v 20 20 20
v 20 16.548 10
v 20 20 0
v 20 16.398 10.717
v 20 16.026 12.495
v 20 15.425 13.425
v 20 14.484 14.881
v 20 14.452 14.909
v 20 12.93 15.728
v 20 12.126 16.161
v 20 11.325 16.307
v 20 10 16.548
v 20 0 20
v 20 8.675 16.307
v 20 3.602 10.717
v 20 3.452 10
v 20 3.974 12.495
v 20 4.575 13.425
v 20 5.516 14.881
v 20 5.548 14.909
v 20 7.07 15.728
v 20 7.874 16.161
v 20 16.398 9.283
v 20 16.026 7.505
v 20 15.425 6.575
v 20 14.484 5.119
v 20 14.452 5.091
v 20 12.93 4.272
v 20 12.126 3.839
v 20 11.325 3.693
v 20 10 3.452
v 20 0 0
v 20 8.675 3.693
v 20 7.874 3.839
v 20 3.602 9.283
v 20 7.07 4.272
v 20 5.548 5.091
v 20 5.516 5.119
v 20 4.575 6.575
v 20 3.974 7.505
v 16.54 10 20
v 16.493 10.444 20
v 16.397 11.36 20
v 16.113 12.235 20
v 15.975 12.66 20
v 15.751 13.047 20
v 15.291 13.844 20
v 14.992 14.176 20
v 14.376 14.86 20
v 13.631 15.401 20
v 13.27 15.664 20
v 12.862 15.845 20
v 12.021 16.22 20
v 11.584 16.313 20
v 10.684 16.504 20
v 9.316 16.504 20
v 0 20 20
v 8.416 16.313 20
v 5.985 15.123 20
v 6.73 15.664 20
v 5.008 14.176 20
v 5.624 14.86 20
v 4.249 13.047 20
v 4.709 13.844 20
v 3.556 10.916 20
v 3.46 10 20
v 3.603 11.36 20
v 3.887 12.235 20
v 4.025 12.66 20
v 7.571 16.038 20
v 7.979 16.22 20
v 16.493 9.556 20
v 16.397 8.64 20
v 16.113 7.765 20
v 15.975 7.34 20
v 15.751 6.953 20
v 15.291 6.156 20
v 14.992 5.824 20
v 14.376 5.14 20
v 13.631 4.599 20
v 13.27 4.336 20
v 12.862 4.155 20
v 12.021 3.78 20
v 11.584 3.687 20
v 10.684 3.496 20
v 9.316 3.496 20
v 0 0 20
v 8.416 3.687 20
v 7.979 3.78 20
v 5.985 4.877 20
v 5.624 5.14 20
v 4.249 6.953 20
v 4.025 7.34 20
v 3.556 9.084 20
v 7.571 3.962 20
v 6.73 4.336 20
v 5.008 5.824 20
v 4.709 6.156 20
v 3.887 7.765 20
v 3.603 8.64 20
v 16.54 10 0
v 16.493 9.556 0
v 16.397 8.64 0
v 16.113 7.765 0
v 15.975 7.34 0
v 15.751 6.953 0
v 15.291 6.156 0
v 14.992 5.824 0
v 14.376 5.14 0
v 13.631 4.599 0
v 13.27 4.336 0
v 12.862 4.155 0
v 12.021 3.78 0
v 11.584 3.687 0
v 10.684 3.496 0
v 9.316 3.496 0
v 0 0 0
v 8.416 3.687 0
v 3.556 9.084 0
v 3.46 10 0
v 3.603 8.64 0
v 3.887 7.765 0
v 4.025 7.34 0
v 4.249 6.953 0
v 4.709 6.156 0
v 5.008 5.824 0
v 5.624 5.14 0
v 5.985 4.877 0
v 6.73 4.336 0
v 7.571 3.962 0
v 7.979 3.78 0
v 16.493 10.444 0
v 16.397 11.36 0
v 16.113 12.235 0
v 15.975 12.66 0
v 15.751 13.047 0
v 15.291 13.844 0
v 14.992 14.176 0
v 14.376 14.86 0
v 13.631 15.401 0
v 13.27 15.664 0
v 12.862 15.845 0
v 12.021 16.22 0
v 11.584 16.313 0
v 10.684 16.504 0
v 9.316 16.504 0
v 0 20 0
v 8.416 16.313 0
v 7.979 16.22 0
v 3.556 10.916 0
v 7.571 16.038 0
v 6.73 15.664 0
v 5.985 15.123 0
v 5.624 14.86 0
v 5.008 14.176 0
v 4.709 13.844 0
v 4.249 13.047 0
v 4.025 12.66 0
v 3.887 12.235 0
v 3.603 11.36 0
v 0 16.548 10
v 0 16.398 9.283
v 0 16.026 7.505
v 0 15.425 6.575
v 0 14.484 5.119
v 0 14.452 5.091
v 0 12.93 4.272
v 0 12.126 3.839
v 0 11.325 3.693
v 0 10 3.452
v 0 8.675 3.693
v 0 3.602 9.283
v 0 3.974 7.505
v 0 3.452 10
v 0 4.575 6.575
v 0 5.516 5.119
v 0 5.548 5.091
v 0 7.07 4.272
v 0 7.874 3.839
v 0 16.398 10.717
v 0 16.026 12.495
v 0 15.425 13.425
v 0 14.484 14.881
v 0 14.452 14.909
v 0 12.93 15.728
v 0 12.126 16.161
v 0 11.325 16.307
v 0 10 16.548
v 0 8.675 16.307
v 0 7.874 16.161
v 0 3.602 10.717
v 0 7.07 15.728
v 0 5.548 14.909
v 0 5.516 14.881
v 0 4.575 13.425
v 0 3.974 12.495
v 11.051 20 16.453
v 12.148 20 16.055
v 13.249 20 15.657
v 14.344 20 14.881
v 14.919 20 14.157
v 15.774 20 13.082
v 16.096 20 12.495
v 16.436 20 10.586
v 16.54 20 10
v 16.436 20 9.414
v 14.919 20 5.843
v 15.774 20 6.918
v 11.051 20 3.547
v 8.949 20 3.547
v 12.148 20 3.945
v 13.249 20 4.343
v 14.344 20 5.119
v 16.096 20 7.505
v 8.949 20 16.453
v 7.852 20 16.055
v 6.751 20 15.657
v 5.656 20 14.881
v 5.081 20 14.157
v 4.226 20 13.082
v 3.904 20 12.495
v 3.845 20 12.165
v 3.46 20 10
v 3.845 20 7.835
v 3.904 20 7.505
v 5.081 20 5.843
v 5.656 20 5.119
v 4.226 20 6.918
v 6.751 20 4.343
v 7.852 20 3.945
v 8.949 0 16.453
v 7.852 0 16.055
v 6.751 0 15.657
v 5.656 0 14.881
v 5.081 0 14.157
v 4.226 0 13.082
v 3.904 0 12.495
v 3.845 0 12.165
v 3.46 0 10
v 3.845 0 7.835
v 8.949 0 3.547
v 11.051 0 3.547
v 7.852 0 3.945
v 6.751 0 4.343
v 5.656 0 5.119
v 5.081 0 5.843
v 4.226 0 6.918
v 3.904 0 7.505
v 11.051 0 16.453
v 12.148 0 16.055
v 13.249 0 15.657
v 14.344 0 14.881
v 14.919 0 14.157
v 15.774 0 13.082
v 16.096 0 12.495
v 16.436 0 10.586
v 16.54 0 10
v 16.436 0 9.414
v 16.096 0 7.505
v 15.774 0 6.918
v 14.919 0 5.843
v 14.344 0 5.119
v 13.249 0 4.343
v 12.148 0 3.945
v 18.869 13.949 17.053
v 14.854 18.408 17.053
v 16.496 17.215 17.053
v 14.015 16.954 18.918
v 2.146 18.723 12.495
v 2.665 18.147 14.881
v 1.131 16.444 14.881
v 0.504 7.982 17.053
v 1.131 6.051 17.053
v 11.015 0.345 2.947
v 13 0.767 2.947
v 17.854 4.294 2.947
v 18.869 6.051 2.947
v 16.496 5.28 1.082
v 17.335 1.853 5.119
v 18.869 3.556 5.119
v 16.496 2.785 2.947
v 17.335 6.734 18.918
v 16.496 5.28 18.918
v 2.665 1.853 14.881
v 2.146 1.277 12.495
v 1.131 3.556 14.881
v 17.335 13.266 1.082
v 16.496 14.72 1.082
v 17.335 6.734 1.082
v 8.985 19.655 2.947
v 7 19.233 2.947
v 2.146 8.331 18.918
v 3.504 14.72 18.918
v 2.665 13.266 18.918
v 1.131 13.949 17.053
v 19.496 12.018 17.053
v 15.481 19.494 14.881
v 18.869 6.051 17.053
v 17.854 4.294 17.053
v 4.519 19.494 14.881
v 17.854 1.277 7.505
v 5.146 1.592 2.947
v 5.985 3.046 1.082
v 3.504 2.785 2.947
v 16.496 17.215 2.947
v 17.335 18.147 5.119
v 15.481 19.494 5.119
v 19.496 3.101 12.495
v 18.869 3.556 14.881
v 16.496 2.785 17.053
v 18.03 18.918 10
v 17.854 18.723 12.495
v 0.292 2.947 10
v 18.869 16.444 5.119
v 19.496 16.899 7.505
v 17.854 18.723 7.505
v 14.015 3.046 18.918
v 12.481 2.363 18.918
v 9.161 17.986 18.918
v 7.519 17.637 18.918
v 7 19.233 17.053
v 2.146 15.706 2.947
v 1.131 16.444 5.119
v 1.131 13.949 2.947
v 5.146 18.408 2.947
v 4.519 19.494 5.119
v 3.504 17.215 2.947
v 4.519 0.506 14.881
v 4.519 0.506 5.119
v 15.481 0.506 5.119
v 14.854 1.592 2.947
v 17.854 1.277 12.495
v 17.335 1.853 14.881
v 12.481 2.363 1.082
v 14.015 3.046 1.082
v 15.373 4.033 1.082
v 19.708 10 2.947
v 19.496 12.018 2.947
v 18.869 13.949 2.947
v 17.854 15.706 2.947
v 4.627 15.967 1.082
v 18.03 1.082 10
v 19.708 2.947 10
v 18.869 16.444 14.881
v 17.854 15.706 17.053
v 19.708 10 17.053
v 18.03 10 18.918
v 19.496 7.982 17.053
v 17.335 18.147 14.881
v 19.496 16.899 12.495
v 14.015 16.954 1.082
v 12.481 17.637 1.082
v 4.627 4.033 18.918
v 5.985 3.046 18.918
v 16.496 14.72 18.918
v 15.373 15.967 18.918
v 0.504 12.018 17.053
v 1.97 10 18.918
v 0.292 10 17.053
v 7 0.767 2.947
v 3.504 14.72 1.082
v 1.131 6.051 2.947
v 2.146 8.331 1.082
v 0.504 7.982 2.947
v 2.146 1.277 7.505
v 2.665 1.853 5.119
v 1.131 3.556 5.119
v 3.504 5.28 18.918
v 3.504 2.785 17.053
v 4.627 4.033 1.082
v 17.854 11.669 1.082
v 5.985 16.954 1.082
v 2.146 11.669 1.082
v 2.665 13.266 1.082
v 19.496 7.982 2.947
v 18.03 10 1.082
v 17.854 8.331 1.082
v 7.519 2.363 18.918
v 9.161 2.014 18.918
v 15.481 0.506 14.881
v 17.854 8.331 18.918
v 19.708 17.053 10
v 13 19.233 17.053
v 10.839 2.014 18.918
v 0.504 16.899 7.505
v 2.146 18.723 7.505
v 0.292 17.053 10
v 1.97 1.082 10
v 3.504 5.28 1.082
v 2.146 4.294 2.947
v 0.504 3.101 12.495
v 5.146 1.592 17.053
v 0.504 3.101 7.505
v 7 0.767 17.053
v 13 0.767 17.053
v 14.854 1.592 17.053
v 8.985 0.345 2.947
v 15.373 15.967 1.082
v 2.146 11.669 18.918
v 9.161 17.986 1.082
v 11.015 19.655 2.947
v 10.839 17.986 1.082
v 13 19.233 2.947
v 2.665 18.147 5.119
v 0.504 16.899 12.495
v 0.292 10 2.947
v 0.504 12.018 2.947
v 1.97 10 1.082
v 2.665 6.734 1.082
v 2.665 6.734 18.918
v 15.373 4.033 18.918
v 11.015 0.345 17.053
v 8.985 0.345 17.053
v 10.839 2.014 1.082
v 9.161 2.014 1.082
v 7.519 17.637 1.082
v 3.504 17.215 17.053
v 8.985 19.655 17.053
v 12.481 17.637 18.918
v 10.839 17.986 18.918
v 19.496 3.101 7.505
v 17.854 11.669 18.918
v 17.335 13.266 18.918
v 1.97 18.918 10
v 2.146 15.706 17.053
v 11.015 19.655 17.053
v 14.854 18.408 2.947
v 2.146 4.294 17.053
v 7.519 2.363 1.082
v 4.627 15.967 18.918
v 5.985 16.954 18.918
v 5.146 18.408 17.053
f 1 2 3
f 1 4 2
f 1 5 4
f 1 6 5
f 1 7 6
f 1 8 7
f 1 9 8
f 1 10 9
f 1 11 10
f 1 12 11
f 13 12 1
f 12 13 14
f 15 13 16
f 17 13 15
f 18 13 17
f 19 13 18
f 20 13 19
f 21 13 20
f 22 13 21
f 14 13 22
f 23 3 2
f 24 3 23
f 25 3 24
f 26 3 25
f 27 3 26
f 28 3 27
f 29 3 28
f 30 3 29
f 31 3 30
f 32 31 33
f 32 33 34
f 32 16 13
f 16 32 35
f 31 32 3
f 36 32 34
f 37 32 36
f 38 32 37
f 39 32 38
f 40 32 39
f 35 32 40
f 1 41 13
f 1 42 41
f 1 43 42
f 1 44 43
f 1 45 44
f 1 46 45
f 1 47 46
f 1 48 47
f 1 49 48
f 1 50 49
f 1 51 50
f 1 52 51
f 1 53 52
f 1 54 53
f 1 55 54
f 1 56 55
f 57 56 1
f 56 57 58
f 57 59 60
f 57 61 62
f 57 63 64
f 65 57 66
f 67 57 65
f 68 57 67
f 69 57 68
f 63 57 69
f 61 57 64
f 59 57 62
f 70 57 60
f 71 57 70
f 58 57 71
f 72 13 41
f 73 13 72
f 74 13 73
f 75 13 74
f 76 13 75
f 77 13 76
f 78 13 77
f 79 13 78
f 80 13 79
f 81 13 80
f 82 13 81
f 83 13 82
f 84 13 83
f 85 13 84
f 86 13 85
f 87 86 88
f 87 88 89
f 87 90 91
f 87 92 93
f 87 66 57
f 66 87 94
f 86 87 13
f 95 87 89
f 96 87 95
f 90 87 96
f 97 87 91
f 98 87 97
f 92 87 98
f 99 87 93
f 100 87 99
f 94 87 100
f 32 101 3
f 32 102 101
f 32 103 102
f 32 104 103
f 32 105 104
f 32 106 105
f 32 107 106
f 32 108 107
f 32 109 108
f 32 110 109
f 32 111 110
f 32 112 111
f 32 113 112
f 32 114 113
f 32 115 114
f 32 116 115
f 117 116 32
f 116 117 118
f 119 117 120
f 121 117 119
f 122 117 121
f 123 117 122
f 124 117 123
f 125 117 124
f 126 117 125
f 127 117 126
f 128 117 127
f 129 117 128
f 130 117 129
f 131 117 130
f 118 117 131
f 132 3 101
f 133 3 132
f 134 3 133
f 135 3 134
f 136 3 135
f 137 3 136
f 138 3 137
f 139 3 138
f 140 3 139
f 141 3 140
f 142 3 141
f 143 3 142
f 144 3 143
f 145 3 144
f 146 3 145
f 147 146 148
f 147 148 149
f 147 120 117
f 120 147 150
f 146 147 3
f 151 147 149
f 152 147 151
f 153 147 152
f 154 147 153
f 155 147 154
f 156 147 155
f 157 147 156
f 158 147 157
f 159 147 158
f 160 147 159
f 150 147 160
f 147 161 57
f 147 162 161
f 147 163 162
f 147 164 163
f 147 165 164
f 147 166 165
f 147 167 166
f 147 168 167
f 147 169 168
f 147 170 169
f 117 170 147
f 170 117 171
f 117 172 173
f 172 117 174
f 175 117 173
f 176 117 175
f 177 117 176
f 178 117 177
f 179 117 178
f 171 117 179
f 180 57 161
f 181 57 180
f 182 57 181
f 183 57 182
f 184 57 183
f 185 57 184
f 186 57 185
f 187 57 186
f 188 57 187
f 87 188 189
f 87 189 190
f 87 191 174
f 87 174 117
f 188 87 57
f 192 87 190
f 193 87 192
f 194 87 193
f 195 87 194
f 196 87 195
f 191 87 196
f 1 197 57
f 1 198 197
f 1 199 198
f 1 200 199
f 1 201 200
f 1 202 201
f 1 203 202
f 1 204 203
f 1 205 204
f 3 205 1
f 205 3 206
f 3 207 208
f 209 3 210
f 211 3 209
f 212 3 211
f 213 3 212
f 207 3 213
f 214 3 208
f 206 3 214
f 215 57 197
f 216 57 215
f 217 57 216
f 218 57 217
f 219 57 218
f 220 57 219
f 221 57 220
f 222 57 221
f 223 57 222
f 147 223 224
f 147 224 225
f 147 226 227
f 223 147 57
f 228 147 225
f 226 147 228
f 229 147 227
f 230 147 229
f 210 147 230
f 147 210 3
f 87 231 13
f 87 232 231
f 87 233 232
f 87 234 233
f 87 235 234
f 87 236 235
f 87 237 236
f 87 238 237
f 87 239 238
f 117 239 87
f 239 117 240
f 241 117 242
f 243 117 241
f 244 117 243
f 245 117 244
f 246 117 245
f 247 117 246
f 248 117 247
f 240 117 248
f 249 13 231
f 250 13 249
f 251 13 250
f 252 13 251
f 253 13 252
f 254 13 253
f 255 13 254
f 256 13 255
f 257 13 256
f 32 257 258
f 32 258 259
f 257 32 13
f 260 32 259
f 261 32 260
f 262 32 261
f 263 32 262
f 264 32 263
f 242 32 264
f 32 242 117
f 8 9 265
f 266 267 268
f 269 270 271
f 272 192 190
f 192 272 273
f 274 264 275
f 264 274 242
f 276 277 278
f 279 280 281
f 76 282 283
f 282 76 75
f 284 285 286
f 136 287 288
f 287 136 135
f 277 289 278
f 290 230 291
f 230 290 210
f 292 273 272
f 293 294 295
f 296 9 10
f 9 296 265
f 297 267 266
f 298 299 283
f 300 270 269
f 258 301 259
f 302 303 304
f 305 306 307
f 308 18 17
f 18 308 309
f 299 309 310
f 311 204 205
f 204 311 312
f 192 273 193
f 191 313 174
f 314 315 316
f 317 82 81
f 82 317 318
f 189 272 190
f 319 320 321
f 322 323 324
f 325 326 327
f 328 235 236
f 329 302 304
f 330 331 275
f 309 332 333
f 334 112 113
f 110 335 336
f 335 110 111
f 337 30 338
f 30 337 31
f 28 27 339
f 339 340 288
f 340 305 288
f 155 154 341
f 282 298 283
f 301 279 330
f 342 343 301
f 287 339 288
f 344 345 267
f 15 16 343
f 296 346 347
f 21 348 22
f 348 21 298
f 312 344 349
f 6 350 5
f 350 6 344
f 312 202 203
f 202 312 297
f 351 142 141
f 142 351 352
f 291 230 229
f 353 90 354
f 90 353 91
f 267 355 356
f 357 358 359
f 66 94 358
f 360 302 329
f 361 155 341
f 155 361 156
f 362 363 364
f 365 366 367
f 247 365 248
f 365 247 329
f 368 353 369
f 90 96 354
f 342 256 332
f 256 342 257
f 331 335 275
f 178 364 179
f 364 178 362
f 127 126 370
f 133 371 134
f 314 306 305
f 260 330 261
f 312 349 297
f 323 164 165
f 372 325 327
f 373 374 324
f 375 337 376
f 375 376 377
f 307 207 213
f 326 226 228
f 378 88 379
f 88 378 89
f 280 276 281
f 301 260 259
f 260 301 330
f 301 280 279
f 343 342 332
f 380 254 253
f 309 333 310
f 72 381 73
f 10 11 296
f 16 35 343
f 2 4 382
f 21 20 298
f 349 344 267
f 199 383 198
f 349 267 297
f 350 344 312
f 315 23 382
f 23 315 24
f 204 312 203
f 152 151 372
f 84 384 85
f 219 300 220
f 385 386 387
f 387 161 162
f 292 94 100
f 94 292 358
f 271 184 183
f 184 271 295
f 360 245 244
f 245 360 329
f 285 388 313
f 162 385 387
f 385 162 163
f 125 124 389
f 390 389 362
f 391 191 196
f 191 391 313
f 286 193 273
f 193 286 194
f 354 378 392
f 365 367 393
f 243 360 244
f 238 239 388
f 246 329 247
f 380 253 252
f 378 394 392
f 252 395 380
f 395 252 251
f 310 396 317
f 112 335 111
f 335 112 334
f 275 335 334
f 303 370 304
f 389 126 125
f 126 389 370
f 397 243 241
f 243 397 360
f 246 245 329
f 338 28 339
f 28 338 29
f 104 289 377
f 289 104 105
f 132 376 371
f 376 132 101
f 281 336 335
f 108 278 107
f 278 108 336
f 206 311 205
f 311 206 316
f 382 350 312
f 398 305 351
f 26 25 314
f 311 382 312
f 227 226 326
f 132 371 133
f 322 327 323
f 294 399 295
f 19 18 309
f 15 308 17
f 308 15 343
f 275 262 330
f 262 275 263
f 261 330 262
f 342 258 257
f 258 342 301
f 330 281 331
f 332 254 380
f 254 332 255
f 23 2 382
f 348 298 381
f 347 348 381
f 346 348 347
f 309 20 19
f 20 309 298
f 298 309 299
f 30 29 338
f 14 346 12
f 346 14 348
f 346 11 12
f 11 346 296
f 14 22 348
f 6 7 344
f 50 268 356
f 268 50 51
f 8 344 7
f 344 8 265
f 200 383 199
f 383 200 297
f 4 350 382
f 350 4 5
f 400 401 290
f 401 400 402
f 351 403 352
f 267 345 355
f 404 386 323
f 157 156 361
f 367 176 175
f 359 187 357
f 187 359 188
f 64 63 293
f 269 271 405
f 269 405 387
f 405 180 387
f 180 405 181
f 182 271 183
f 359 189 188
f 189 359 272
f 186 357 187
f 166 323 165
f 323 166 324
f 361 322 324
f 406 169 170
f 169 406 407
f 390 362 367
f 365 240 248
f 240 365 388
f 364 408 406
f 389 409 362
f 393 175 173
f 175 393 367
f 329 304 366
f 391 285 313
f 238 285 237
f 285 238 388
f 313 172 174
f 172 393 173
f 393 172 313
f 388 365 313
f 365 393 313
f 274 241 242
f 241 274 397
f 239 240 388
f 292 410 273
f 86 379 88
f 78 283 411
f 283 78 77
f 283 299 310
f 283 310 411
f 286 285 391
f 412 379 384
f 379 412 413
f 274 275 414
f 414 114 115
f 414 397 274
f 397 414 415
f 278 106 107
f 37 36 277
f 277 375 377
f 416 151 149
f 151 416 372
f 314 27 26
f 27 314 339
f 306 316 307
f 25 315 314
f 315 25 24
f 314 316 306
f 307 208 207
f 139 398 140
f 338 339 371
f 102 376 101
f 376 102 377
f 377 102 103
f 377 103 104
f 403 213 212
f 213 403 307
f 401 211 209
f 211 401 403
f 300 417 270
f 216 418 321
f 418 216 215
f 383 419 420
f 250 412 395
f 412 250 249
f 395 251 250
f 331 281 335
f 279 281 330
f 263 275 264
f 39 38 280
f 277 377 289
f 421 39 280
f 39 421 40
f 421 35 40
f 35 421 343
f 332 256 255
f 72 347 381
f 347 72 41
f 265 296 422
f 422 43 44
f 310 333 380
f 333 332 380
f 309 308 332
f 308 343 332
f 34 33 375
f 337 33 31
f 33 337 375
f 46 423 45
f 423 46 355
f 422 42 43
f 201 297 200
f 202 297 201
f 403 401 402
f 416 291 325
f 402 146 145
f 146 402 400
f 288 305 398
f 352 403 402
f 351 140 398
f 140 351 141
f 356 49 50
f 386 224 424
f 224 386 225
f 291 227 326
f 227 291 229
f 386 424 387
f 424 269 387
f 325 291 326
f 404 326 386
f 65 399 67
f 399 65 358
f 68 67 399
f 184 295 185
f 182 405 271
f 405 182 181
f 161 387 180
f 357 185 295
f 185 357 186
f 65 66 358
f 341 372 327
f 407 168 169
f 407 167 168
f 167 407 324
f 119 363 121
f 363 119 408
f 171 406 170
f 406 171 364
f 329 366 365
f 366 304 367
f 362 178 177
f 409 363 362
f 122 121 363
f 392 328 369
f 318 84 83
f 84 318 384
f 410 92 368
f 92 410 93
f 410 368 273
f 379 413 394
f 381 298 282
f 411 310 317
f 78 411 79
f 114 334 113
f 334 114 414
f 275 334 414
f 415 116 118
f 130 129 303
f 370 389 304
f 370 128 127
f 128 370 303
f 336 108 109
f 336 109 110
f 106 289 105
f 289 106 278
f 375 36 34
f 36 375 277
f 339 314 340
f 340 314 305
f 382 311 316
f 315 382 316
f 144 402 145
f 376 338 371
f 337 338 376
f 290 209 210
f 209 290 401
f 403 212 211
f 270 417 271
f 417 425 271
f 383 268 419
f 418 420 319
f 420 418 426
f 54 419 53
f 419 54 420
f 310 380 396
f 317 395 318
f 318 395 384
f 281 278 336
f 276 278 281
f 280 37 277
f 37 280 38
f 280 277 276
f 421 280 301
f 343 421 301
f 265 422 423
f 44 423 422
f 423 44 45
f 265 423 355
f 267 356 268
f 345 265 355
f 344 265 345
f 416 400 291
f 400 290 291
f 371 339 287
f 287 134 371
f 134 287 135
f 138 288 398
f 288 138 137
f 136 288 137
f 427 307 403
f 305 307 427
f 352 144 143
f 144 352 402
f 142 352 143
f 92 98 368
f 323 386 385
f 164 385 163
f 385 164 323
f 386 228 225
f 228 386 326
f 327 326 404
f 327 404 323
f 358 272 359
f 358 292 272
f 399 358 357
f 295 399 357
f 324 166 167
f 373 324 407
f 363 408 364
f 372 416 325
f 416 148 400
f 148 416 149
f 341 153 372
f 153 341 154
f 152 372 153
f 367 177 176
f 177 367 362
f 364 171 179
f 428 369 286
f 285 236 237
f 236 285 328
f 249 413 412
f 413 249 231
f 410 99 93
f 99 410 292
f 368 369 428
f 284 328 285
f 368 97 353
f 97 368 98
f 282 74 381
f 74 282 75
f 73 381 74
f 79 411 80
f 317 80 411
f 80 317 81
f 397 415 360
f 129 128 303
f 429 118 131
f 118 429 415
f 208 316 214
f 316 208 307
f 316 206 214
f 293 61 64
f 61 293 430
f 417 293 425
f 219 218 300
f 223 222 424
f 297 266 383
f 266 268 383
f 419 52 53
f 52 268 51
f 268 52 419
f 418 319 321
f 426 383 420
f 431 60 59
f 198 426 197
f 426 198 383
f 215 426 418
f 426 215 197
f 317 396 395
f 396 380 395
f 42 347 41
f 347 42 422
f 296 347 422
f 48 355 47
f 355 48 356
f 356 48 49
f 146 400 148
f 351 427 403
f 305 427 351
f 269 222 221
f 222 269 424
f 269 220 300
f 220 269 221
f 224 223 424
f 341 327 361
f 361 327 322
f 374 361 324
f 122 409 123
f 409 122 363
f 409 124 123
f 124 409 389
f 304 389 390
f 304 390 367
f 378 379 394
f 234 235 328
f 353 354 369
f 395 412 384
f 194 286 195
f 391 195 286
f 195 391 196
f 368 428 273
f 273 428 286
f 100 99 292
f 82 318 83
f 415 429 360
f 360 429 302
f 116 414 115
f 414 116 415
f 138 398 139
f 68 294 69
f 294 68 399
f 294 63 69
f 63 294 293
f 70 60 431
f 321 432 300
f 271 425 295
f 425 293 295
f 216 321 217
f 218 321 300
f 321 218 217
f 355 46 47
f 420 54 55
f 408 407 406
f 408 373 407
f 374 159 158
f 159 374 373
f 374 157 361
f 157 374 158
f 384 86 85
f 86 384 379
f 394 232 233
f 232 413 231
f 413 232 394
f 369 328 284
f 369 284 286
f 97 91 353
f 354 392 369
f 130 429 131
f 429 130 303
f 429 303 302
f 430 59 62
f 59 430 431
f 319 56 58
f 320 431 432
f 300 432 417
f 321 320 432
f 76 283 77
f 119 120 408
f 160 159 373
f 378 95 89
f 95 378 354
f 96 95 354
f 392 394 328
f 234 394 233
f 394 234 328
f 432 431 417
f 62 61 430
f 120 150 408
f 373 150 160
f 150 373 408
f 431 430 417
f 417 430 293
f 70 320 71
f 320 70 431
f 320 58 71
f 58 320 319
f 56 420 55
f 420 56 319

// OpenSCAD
// Difference operation - cube with sphere subtracted
difference() {
    cube([20, 20, 20]);
    translate([10, 10, 10])
        sphere(r=12);
}
